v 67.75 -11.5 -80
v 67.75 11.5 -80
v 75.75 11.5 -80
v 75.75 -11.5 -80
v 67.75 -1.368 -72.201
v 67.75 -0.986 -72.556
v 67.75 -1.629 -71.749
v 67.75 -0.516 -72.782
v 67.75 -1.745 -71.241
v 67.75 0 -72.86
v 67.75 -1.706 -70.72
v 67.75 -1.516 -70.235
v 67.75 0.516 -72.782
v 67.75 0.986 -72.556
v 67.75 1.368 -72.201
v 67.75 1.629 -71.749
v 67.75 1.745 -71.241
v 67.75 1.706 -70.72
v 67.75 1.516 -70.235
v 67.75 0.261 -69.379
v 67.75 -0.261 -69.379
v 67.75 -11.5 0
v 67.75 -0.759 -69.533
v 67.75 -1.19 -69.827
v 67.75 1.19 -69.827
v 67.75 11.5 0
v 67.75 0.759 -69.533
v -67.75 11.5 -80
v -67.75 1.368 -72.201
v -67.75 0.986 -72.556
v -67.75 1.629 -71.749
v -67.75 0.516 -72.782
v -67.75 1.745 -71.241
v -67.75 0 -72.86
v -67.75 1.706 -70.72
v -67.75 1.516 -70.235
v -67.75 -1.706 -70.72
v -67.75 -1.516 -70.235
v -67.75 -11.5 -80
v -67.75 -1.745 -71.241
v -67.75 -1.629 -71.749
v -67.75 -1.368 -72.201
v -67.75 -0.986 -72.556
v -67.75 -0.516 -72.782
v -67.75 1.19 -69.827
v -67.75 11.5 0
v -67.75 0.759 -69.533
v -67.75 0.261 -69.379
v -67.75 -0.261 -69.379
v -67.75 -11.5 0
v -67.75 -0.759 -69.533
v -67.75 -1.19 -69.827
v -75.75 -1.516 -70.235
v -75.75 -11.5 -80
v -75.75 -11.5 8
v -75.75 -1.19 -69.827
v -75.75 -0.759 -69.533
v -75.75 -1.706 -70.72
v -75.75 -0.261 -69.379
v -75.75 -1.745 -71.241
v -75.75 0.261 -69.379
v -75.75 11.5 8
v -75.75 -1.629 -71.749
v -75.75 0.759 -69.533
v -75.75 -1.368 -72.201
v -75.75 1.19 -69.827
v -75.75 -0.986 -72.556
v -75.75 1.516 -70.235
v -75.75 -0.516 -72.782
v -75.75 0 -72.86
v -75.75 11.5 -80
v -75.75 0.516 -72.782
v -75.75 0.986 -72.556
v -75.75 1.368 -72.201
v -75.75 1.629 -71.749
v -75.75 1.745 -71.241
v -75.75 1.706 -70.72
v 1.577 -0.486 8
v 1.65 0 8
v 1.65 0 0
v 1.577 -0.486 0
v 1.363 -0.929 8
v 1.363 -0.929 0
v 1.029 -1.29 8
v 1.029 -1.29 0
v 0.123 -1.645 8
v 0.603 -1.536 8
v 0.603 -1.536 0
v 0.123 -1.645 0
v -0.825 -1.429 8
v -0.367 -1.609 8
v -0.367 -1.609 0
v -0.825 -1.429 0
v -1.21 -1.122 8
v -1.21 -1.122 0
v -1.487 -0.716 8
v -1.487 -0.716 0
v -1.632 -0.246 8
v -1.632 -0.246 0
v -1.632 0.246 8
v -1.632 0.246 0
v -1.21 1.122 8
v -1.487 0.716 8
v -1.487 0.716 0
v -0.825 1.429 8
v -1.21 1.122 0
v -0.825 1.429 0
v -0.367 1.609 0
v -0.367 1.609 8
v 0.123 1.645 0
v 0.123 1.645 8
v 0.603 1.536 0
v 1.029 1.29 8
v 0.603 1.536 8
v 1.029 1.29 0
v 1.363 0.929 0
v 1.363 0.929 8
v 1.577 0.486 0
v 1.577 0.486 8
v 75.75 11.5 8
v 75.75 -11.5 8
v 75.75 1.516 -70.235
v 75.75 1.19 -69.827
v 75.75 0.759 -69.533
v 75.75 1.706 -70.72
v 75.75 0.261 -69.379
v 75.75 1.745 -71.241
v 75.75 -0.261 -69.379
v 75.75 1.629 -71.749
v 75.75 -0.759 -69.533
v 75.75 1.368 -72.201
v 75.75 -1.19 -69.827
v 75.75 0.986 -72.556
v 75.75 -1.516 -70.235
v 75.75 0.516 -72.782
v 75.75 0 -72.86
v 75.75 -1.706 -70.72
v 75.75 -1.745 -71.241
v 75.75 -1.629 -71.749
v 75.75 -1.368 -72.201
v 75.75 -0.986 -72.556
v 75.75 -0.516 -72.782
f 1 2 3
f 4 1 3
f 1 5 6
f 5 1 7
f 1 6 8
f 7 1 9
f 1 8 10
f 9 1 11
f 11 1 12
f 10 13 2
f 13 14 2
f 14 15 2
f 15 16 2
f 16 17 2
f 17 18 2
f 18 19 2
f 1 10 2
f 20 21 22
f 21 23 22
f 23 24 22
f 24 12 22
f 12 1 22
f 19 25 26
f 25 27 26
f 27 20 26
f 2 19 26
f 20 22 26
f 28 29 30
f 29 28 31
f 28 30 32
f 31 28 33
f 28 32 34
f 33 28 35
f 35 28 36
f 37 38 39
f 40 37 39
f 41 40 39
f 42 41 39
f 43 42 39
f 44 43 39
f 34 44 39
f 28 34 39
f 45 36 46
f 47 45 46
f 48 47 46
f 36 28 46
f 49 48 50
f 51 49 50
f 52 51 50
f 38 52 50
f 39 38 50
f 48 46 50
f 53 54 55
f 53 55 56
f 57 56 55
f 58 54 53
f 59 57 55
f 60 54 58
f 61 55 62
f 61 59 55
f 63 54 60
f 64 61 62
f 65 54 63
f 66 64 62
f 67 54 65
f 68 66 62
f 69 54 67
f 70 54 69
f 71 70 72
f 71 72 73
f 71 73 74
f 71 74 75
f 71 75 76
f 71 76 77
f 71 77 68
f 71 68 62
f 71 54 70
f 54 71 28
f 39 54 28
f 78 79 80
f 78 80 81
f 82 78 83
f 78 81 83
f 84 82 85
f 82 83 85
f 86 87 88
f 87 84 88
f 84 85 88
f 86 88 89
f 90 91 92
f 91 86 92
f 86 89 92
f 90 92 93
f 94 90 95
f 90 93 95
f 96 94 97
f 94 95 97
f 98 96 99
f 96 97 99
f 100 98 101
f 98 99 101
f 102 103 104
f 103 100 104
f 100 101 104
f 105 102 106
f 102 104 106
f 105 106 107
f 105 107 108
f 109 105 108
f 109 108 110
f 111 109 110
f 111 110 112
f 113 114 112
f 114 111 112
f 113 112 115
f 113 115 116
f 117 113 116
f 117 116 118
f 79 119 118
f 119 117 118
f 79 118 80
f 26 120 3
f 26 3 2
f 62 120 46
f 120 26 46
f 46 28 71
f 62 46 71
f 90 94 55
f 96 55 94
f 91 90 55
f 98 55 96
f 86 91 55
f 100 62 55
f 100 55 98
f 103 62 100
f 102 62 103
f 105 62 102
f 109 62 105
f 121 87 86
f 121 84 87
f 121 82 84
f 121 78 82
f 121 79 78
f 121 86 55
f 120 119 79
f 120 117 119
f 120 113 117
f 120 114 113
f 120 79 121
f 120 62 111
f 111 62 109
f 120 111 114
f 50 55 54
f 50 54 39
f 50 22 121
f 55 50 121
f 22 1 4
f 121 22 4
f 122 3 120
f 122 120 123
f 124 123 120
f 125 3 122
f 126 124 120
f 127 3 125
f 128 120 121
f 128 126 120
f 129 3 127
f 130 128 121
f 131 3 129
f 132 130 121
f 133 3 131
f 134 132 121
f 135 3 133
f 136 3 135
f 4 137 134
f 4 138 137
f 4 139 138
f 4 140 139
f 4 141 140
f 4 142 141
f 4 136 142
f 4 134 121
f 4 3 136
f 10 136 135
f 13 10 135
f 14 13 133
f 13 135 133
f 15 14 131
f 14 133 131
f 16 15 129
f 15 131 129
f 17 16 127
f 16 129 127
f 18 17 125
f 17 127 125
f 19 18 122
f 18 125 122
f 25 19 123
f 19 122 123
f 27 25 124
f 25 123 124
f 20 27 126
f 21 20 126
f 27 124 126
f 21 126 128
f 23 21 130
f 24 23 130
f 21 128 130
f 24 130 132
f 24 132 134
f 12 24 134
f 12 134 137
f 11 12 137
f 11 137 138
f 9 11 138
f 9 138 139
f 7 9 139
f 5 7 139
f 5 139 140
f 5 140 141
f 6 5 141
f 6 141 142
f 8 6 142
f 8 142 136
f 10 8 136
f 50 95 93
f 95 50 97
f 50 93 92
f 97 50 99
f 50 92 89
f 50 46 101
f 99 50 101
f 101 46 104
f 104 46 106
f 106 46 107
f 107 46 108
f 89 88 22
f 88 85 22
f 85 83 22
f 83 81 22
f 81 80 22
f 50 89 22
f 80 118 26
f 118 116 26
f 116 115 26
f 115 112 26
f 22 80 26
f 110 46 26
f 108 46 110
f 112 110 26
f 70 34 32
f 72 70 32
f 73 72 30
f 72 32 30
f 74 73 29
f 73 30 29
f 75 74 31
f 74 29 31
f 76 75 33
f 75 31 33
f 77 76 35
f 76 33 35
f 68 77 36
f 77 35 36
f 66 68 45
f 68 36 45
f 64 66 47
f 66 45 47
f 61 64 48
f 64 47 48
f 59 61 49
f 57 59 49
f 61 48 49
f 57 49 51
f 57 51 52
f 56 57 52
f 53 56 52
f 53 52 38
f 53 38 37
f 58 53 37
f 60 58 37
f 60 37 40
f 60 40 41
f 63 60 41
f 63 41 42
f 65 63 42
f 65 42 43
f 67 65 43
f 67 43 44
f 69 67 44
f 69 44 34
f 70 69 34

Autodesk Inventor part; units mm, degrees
ref_plane "YZ Plane" through (0, 0, 0) normal (1, 0, 0) x (0, 1, 0)
ref_plane "XZ Plane" through (0, 0, 0) normal (0, 1, 0) x (-1, 0, 0)
ref_plane "XY Plane" through (0, 0, 0) normal (0, 0, 1) x (1, 0, 0)
sketch "Sketch1" plane through (0, 0, 0) normal (0, 0, 1) x (1, 0, 0)
  circle A0 centre (0, 0) radius 11.5
  circle A1 centre (0, 0) radius 1.65
  line L0 (-11.5, 0) -> (-11.5, -5)
  line L1 (-11.5, 0) -> (-11.5, 5)
  line L2 (-11.5, 5) -> (-10.3562, 5)
  line L3 (-11.5, -5) -> (-10.3562, -5)
  line L4 (11.5, 0) -> (11.5, 5)
  line L5 (11.5, 5) -> (10.3562, 5)
  line L6 (11.5, 0) -> (11.5, -5)
  line L7 (11.5, -5) -> (10.3562, -5)
  line L8 (-67.75, 0) -> (-67.75, 5)
  line L9 (-67.75, 5) -> (-11.5, 5)
  line L10 (-67.75, 0) -> (-67.75, -5)
  line L11 (-67.75, -5) -> (-11.5, -5)
  line L12 (67.75, -5) -> (67.75, 5)
  line L13 (67.75, 5) -> (11.5, 5)
  line L14 (11.5, -5) -> (67.75, -5)
  line L15 (67.75, -5) -> (71.75, -5)
  line L16 (71.75, -5) -> (71.75, 5)
  line L17 (71.75, 5) -> (67.75, 5)
  line L18 (-67.75, -5) -> (-71.75, -5)
  line L19 (-71.75, -5) -> (-71.75, 5)
  line L20 (-71.75, 5) -> (-67.75, 5)
  line L21 (0, 11.5) -> (-71.75, 11.5)
  line L22 (-71.75, 11.5) -> (-71.75, 5)
  line L23 (-71.75, -5) -> (-71.75, -11.5)
  line L24 (-71.75, -11.5) -> (0, -11.5)
  line L25 (0, -11.5) -> (71.75, -11.5)
  line L26 (71.75, -11.5) -> (71.75, -5)
  line L27 (71.75, 5) -> (71.75, 11.5)
  line L28 (0, 11.5) -> (71.75, 11.5)
  line L29 (67.75, 5) -> (67.75, 11.5)
  line L30 (67.75, 11.5) -> (63.75, 11.5)
  line L31 (63.75, 11.5) -> (63.75, -11.5)
  line L32 (-71.75, -11.5) -> (-63.75, -11.5)
  line L33 (-63.75, -11.5) -> (-63.75, 11.5)
  line L34 (-67.75, -11.5) -> (-75.75, -11.5)
  line L35 (-75.75, -11.5) -> (-75.75, 11.5)
  line L36 (-75.75, 11.5) -> (-67.75, 11.5)
  line L37 (-67.75, 11.5) -> (-67.75, -11.5)
  line L38 (67.75, 11.5) -> (75.75, 11.5)
  line L39 (75.75, 11.5) -> (75.75, -11.5)
  line L40 (75.75, -11.5) -> (67.75, -11.5)
  line L41 (67.75, -11.5) -> (67.75, 11.5)
  dimension "d0" = 23
  dimension "d1" = 3.3
  dimension "d4" = 5
  dimension "d5" = 5
  dimension "d6" = 5
  dimension "d7" = 5
  dimension "d12" = 4
  dimension "d13" = 4
  dimension "d20" = 4
  dimension "d21" = 8
  dimension "d24" = 8
  dimension "d25" = 8
extrude "Extrusion1" add sketch "Sketch1" along normal blind 8
extrude "Extrusion2" add sketch "Sketch1" against normal blind 80 contours L17 L16 L15 L12 | L29 L28 L27 L17 | L15 L26 L25 L41 | L37 L20 L22 L21 | L24 L23 L18 L37 | L27 L38 L39 L40 L26 L16 | L22 L19 L23 L34 L35 L36 | L8 L10 L18 L19 L20
sketch "Sketch4" plane through (75.75, -11.5, 8) normal (1, 0, 0) x (0, 0, -1)
  circle A0 centre (79.1099, 11.5) radius 1.75
  point P0 (8, 11.5)
  dimension "d26" = 3.5
extrude "Extrusion5" cut sketch "Sketch4" against normal blind 800
properties part number "Sensor houder" material "ABS Plastic"
